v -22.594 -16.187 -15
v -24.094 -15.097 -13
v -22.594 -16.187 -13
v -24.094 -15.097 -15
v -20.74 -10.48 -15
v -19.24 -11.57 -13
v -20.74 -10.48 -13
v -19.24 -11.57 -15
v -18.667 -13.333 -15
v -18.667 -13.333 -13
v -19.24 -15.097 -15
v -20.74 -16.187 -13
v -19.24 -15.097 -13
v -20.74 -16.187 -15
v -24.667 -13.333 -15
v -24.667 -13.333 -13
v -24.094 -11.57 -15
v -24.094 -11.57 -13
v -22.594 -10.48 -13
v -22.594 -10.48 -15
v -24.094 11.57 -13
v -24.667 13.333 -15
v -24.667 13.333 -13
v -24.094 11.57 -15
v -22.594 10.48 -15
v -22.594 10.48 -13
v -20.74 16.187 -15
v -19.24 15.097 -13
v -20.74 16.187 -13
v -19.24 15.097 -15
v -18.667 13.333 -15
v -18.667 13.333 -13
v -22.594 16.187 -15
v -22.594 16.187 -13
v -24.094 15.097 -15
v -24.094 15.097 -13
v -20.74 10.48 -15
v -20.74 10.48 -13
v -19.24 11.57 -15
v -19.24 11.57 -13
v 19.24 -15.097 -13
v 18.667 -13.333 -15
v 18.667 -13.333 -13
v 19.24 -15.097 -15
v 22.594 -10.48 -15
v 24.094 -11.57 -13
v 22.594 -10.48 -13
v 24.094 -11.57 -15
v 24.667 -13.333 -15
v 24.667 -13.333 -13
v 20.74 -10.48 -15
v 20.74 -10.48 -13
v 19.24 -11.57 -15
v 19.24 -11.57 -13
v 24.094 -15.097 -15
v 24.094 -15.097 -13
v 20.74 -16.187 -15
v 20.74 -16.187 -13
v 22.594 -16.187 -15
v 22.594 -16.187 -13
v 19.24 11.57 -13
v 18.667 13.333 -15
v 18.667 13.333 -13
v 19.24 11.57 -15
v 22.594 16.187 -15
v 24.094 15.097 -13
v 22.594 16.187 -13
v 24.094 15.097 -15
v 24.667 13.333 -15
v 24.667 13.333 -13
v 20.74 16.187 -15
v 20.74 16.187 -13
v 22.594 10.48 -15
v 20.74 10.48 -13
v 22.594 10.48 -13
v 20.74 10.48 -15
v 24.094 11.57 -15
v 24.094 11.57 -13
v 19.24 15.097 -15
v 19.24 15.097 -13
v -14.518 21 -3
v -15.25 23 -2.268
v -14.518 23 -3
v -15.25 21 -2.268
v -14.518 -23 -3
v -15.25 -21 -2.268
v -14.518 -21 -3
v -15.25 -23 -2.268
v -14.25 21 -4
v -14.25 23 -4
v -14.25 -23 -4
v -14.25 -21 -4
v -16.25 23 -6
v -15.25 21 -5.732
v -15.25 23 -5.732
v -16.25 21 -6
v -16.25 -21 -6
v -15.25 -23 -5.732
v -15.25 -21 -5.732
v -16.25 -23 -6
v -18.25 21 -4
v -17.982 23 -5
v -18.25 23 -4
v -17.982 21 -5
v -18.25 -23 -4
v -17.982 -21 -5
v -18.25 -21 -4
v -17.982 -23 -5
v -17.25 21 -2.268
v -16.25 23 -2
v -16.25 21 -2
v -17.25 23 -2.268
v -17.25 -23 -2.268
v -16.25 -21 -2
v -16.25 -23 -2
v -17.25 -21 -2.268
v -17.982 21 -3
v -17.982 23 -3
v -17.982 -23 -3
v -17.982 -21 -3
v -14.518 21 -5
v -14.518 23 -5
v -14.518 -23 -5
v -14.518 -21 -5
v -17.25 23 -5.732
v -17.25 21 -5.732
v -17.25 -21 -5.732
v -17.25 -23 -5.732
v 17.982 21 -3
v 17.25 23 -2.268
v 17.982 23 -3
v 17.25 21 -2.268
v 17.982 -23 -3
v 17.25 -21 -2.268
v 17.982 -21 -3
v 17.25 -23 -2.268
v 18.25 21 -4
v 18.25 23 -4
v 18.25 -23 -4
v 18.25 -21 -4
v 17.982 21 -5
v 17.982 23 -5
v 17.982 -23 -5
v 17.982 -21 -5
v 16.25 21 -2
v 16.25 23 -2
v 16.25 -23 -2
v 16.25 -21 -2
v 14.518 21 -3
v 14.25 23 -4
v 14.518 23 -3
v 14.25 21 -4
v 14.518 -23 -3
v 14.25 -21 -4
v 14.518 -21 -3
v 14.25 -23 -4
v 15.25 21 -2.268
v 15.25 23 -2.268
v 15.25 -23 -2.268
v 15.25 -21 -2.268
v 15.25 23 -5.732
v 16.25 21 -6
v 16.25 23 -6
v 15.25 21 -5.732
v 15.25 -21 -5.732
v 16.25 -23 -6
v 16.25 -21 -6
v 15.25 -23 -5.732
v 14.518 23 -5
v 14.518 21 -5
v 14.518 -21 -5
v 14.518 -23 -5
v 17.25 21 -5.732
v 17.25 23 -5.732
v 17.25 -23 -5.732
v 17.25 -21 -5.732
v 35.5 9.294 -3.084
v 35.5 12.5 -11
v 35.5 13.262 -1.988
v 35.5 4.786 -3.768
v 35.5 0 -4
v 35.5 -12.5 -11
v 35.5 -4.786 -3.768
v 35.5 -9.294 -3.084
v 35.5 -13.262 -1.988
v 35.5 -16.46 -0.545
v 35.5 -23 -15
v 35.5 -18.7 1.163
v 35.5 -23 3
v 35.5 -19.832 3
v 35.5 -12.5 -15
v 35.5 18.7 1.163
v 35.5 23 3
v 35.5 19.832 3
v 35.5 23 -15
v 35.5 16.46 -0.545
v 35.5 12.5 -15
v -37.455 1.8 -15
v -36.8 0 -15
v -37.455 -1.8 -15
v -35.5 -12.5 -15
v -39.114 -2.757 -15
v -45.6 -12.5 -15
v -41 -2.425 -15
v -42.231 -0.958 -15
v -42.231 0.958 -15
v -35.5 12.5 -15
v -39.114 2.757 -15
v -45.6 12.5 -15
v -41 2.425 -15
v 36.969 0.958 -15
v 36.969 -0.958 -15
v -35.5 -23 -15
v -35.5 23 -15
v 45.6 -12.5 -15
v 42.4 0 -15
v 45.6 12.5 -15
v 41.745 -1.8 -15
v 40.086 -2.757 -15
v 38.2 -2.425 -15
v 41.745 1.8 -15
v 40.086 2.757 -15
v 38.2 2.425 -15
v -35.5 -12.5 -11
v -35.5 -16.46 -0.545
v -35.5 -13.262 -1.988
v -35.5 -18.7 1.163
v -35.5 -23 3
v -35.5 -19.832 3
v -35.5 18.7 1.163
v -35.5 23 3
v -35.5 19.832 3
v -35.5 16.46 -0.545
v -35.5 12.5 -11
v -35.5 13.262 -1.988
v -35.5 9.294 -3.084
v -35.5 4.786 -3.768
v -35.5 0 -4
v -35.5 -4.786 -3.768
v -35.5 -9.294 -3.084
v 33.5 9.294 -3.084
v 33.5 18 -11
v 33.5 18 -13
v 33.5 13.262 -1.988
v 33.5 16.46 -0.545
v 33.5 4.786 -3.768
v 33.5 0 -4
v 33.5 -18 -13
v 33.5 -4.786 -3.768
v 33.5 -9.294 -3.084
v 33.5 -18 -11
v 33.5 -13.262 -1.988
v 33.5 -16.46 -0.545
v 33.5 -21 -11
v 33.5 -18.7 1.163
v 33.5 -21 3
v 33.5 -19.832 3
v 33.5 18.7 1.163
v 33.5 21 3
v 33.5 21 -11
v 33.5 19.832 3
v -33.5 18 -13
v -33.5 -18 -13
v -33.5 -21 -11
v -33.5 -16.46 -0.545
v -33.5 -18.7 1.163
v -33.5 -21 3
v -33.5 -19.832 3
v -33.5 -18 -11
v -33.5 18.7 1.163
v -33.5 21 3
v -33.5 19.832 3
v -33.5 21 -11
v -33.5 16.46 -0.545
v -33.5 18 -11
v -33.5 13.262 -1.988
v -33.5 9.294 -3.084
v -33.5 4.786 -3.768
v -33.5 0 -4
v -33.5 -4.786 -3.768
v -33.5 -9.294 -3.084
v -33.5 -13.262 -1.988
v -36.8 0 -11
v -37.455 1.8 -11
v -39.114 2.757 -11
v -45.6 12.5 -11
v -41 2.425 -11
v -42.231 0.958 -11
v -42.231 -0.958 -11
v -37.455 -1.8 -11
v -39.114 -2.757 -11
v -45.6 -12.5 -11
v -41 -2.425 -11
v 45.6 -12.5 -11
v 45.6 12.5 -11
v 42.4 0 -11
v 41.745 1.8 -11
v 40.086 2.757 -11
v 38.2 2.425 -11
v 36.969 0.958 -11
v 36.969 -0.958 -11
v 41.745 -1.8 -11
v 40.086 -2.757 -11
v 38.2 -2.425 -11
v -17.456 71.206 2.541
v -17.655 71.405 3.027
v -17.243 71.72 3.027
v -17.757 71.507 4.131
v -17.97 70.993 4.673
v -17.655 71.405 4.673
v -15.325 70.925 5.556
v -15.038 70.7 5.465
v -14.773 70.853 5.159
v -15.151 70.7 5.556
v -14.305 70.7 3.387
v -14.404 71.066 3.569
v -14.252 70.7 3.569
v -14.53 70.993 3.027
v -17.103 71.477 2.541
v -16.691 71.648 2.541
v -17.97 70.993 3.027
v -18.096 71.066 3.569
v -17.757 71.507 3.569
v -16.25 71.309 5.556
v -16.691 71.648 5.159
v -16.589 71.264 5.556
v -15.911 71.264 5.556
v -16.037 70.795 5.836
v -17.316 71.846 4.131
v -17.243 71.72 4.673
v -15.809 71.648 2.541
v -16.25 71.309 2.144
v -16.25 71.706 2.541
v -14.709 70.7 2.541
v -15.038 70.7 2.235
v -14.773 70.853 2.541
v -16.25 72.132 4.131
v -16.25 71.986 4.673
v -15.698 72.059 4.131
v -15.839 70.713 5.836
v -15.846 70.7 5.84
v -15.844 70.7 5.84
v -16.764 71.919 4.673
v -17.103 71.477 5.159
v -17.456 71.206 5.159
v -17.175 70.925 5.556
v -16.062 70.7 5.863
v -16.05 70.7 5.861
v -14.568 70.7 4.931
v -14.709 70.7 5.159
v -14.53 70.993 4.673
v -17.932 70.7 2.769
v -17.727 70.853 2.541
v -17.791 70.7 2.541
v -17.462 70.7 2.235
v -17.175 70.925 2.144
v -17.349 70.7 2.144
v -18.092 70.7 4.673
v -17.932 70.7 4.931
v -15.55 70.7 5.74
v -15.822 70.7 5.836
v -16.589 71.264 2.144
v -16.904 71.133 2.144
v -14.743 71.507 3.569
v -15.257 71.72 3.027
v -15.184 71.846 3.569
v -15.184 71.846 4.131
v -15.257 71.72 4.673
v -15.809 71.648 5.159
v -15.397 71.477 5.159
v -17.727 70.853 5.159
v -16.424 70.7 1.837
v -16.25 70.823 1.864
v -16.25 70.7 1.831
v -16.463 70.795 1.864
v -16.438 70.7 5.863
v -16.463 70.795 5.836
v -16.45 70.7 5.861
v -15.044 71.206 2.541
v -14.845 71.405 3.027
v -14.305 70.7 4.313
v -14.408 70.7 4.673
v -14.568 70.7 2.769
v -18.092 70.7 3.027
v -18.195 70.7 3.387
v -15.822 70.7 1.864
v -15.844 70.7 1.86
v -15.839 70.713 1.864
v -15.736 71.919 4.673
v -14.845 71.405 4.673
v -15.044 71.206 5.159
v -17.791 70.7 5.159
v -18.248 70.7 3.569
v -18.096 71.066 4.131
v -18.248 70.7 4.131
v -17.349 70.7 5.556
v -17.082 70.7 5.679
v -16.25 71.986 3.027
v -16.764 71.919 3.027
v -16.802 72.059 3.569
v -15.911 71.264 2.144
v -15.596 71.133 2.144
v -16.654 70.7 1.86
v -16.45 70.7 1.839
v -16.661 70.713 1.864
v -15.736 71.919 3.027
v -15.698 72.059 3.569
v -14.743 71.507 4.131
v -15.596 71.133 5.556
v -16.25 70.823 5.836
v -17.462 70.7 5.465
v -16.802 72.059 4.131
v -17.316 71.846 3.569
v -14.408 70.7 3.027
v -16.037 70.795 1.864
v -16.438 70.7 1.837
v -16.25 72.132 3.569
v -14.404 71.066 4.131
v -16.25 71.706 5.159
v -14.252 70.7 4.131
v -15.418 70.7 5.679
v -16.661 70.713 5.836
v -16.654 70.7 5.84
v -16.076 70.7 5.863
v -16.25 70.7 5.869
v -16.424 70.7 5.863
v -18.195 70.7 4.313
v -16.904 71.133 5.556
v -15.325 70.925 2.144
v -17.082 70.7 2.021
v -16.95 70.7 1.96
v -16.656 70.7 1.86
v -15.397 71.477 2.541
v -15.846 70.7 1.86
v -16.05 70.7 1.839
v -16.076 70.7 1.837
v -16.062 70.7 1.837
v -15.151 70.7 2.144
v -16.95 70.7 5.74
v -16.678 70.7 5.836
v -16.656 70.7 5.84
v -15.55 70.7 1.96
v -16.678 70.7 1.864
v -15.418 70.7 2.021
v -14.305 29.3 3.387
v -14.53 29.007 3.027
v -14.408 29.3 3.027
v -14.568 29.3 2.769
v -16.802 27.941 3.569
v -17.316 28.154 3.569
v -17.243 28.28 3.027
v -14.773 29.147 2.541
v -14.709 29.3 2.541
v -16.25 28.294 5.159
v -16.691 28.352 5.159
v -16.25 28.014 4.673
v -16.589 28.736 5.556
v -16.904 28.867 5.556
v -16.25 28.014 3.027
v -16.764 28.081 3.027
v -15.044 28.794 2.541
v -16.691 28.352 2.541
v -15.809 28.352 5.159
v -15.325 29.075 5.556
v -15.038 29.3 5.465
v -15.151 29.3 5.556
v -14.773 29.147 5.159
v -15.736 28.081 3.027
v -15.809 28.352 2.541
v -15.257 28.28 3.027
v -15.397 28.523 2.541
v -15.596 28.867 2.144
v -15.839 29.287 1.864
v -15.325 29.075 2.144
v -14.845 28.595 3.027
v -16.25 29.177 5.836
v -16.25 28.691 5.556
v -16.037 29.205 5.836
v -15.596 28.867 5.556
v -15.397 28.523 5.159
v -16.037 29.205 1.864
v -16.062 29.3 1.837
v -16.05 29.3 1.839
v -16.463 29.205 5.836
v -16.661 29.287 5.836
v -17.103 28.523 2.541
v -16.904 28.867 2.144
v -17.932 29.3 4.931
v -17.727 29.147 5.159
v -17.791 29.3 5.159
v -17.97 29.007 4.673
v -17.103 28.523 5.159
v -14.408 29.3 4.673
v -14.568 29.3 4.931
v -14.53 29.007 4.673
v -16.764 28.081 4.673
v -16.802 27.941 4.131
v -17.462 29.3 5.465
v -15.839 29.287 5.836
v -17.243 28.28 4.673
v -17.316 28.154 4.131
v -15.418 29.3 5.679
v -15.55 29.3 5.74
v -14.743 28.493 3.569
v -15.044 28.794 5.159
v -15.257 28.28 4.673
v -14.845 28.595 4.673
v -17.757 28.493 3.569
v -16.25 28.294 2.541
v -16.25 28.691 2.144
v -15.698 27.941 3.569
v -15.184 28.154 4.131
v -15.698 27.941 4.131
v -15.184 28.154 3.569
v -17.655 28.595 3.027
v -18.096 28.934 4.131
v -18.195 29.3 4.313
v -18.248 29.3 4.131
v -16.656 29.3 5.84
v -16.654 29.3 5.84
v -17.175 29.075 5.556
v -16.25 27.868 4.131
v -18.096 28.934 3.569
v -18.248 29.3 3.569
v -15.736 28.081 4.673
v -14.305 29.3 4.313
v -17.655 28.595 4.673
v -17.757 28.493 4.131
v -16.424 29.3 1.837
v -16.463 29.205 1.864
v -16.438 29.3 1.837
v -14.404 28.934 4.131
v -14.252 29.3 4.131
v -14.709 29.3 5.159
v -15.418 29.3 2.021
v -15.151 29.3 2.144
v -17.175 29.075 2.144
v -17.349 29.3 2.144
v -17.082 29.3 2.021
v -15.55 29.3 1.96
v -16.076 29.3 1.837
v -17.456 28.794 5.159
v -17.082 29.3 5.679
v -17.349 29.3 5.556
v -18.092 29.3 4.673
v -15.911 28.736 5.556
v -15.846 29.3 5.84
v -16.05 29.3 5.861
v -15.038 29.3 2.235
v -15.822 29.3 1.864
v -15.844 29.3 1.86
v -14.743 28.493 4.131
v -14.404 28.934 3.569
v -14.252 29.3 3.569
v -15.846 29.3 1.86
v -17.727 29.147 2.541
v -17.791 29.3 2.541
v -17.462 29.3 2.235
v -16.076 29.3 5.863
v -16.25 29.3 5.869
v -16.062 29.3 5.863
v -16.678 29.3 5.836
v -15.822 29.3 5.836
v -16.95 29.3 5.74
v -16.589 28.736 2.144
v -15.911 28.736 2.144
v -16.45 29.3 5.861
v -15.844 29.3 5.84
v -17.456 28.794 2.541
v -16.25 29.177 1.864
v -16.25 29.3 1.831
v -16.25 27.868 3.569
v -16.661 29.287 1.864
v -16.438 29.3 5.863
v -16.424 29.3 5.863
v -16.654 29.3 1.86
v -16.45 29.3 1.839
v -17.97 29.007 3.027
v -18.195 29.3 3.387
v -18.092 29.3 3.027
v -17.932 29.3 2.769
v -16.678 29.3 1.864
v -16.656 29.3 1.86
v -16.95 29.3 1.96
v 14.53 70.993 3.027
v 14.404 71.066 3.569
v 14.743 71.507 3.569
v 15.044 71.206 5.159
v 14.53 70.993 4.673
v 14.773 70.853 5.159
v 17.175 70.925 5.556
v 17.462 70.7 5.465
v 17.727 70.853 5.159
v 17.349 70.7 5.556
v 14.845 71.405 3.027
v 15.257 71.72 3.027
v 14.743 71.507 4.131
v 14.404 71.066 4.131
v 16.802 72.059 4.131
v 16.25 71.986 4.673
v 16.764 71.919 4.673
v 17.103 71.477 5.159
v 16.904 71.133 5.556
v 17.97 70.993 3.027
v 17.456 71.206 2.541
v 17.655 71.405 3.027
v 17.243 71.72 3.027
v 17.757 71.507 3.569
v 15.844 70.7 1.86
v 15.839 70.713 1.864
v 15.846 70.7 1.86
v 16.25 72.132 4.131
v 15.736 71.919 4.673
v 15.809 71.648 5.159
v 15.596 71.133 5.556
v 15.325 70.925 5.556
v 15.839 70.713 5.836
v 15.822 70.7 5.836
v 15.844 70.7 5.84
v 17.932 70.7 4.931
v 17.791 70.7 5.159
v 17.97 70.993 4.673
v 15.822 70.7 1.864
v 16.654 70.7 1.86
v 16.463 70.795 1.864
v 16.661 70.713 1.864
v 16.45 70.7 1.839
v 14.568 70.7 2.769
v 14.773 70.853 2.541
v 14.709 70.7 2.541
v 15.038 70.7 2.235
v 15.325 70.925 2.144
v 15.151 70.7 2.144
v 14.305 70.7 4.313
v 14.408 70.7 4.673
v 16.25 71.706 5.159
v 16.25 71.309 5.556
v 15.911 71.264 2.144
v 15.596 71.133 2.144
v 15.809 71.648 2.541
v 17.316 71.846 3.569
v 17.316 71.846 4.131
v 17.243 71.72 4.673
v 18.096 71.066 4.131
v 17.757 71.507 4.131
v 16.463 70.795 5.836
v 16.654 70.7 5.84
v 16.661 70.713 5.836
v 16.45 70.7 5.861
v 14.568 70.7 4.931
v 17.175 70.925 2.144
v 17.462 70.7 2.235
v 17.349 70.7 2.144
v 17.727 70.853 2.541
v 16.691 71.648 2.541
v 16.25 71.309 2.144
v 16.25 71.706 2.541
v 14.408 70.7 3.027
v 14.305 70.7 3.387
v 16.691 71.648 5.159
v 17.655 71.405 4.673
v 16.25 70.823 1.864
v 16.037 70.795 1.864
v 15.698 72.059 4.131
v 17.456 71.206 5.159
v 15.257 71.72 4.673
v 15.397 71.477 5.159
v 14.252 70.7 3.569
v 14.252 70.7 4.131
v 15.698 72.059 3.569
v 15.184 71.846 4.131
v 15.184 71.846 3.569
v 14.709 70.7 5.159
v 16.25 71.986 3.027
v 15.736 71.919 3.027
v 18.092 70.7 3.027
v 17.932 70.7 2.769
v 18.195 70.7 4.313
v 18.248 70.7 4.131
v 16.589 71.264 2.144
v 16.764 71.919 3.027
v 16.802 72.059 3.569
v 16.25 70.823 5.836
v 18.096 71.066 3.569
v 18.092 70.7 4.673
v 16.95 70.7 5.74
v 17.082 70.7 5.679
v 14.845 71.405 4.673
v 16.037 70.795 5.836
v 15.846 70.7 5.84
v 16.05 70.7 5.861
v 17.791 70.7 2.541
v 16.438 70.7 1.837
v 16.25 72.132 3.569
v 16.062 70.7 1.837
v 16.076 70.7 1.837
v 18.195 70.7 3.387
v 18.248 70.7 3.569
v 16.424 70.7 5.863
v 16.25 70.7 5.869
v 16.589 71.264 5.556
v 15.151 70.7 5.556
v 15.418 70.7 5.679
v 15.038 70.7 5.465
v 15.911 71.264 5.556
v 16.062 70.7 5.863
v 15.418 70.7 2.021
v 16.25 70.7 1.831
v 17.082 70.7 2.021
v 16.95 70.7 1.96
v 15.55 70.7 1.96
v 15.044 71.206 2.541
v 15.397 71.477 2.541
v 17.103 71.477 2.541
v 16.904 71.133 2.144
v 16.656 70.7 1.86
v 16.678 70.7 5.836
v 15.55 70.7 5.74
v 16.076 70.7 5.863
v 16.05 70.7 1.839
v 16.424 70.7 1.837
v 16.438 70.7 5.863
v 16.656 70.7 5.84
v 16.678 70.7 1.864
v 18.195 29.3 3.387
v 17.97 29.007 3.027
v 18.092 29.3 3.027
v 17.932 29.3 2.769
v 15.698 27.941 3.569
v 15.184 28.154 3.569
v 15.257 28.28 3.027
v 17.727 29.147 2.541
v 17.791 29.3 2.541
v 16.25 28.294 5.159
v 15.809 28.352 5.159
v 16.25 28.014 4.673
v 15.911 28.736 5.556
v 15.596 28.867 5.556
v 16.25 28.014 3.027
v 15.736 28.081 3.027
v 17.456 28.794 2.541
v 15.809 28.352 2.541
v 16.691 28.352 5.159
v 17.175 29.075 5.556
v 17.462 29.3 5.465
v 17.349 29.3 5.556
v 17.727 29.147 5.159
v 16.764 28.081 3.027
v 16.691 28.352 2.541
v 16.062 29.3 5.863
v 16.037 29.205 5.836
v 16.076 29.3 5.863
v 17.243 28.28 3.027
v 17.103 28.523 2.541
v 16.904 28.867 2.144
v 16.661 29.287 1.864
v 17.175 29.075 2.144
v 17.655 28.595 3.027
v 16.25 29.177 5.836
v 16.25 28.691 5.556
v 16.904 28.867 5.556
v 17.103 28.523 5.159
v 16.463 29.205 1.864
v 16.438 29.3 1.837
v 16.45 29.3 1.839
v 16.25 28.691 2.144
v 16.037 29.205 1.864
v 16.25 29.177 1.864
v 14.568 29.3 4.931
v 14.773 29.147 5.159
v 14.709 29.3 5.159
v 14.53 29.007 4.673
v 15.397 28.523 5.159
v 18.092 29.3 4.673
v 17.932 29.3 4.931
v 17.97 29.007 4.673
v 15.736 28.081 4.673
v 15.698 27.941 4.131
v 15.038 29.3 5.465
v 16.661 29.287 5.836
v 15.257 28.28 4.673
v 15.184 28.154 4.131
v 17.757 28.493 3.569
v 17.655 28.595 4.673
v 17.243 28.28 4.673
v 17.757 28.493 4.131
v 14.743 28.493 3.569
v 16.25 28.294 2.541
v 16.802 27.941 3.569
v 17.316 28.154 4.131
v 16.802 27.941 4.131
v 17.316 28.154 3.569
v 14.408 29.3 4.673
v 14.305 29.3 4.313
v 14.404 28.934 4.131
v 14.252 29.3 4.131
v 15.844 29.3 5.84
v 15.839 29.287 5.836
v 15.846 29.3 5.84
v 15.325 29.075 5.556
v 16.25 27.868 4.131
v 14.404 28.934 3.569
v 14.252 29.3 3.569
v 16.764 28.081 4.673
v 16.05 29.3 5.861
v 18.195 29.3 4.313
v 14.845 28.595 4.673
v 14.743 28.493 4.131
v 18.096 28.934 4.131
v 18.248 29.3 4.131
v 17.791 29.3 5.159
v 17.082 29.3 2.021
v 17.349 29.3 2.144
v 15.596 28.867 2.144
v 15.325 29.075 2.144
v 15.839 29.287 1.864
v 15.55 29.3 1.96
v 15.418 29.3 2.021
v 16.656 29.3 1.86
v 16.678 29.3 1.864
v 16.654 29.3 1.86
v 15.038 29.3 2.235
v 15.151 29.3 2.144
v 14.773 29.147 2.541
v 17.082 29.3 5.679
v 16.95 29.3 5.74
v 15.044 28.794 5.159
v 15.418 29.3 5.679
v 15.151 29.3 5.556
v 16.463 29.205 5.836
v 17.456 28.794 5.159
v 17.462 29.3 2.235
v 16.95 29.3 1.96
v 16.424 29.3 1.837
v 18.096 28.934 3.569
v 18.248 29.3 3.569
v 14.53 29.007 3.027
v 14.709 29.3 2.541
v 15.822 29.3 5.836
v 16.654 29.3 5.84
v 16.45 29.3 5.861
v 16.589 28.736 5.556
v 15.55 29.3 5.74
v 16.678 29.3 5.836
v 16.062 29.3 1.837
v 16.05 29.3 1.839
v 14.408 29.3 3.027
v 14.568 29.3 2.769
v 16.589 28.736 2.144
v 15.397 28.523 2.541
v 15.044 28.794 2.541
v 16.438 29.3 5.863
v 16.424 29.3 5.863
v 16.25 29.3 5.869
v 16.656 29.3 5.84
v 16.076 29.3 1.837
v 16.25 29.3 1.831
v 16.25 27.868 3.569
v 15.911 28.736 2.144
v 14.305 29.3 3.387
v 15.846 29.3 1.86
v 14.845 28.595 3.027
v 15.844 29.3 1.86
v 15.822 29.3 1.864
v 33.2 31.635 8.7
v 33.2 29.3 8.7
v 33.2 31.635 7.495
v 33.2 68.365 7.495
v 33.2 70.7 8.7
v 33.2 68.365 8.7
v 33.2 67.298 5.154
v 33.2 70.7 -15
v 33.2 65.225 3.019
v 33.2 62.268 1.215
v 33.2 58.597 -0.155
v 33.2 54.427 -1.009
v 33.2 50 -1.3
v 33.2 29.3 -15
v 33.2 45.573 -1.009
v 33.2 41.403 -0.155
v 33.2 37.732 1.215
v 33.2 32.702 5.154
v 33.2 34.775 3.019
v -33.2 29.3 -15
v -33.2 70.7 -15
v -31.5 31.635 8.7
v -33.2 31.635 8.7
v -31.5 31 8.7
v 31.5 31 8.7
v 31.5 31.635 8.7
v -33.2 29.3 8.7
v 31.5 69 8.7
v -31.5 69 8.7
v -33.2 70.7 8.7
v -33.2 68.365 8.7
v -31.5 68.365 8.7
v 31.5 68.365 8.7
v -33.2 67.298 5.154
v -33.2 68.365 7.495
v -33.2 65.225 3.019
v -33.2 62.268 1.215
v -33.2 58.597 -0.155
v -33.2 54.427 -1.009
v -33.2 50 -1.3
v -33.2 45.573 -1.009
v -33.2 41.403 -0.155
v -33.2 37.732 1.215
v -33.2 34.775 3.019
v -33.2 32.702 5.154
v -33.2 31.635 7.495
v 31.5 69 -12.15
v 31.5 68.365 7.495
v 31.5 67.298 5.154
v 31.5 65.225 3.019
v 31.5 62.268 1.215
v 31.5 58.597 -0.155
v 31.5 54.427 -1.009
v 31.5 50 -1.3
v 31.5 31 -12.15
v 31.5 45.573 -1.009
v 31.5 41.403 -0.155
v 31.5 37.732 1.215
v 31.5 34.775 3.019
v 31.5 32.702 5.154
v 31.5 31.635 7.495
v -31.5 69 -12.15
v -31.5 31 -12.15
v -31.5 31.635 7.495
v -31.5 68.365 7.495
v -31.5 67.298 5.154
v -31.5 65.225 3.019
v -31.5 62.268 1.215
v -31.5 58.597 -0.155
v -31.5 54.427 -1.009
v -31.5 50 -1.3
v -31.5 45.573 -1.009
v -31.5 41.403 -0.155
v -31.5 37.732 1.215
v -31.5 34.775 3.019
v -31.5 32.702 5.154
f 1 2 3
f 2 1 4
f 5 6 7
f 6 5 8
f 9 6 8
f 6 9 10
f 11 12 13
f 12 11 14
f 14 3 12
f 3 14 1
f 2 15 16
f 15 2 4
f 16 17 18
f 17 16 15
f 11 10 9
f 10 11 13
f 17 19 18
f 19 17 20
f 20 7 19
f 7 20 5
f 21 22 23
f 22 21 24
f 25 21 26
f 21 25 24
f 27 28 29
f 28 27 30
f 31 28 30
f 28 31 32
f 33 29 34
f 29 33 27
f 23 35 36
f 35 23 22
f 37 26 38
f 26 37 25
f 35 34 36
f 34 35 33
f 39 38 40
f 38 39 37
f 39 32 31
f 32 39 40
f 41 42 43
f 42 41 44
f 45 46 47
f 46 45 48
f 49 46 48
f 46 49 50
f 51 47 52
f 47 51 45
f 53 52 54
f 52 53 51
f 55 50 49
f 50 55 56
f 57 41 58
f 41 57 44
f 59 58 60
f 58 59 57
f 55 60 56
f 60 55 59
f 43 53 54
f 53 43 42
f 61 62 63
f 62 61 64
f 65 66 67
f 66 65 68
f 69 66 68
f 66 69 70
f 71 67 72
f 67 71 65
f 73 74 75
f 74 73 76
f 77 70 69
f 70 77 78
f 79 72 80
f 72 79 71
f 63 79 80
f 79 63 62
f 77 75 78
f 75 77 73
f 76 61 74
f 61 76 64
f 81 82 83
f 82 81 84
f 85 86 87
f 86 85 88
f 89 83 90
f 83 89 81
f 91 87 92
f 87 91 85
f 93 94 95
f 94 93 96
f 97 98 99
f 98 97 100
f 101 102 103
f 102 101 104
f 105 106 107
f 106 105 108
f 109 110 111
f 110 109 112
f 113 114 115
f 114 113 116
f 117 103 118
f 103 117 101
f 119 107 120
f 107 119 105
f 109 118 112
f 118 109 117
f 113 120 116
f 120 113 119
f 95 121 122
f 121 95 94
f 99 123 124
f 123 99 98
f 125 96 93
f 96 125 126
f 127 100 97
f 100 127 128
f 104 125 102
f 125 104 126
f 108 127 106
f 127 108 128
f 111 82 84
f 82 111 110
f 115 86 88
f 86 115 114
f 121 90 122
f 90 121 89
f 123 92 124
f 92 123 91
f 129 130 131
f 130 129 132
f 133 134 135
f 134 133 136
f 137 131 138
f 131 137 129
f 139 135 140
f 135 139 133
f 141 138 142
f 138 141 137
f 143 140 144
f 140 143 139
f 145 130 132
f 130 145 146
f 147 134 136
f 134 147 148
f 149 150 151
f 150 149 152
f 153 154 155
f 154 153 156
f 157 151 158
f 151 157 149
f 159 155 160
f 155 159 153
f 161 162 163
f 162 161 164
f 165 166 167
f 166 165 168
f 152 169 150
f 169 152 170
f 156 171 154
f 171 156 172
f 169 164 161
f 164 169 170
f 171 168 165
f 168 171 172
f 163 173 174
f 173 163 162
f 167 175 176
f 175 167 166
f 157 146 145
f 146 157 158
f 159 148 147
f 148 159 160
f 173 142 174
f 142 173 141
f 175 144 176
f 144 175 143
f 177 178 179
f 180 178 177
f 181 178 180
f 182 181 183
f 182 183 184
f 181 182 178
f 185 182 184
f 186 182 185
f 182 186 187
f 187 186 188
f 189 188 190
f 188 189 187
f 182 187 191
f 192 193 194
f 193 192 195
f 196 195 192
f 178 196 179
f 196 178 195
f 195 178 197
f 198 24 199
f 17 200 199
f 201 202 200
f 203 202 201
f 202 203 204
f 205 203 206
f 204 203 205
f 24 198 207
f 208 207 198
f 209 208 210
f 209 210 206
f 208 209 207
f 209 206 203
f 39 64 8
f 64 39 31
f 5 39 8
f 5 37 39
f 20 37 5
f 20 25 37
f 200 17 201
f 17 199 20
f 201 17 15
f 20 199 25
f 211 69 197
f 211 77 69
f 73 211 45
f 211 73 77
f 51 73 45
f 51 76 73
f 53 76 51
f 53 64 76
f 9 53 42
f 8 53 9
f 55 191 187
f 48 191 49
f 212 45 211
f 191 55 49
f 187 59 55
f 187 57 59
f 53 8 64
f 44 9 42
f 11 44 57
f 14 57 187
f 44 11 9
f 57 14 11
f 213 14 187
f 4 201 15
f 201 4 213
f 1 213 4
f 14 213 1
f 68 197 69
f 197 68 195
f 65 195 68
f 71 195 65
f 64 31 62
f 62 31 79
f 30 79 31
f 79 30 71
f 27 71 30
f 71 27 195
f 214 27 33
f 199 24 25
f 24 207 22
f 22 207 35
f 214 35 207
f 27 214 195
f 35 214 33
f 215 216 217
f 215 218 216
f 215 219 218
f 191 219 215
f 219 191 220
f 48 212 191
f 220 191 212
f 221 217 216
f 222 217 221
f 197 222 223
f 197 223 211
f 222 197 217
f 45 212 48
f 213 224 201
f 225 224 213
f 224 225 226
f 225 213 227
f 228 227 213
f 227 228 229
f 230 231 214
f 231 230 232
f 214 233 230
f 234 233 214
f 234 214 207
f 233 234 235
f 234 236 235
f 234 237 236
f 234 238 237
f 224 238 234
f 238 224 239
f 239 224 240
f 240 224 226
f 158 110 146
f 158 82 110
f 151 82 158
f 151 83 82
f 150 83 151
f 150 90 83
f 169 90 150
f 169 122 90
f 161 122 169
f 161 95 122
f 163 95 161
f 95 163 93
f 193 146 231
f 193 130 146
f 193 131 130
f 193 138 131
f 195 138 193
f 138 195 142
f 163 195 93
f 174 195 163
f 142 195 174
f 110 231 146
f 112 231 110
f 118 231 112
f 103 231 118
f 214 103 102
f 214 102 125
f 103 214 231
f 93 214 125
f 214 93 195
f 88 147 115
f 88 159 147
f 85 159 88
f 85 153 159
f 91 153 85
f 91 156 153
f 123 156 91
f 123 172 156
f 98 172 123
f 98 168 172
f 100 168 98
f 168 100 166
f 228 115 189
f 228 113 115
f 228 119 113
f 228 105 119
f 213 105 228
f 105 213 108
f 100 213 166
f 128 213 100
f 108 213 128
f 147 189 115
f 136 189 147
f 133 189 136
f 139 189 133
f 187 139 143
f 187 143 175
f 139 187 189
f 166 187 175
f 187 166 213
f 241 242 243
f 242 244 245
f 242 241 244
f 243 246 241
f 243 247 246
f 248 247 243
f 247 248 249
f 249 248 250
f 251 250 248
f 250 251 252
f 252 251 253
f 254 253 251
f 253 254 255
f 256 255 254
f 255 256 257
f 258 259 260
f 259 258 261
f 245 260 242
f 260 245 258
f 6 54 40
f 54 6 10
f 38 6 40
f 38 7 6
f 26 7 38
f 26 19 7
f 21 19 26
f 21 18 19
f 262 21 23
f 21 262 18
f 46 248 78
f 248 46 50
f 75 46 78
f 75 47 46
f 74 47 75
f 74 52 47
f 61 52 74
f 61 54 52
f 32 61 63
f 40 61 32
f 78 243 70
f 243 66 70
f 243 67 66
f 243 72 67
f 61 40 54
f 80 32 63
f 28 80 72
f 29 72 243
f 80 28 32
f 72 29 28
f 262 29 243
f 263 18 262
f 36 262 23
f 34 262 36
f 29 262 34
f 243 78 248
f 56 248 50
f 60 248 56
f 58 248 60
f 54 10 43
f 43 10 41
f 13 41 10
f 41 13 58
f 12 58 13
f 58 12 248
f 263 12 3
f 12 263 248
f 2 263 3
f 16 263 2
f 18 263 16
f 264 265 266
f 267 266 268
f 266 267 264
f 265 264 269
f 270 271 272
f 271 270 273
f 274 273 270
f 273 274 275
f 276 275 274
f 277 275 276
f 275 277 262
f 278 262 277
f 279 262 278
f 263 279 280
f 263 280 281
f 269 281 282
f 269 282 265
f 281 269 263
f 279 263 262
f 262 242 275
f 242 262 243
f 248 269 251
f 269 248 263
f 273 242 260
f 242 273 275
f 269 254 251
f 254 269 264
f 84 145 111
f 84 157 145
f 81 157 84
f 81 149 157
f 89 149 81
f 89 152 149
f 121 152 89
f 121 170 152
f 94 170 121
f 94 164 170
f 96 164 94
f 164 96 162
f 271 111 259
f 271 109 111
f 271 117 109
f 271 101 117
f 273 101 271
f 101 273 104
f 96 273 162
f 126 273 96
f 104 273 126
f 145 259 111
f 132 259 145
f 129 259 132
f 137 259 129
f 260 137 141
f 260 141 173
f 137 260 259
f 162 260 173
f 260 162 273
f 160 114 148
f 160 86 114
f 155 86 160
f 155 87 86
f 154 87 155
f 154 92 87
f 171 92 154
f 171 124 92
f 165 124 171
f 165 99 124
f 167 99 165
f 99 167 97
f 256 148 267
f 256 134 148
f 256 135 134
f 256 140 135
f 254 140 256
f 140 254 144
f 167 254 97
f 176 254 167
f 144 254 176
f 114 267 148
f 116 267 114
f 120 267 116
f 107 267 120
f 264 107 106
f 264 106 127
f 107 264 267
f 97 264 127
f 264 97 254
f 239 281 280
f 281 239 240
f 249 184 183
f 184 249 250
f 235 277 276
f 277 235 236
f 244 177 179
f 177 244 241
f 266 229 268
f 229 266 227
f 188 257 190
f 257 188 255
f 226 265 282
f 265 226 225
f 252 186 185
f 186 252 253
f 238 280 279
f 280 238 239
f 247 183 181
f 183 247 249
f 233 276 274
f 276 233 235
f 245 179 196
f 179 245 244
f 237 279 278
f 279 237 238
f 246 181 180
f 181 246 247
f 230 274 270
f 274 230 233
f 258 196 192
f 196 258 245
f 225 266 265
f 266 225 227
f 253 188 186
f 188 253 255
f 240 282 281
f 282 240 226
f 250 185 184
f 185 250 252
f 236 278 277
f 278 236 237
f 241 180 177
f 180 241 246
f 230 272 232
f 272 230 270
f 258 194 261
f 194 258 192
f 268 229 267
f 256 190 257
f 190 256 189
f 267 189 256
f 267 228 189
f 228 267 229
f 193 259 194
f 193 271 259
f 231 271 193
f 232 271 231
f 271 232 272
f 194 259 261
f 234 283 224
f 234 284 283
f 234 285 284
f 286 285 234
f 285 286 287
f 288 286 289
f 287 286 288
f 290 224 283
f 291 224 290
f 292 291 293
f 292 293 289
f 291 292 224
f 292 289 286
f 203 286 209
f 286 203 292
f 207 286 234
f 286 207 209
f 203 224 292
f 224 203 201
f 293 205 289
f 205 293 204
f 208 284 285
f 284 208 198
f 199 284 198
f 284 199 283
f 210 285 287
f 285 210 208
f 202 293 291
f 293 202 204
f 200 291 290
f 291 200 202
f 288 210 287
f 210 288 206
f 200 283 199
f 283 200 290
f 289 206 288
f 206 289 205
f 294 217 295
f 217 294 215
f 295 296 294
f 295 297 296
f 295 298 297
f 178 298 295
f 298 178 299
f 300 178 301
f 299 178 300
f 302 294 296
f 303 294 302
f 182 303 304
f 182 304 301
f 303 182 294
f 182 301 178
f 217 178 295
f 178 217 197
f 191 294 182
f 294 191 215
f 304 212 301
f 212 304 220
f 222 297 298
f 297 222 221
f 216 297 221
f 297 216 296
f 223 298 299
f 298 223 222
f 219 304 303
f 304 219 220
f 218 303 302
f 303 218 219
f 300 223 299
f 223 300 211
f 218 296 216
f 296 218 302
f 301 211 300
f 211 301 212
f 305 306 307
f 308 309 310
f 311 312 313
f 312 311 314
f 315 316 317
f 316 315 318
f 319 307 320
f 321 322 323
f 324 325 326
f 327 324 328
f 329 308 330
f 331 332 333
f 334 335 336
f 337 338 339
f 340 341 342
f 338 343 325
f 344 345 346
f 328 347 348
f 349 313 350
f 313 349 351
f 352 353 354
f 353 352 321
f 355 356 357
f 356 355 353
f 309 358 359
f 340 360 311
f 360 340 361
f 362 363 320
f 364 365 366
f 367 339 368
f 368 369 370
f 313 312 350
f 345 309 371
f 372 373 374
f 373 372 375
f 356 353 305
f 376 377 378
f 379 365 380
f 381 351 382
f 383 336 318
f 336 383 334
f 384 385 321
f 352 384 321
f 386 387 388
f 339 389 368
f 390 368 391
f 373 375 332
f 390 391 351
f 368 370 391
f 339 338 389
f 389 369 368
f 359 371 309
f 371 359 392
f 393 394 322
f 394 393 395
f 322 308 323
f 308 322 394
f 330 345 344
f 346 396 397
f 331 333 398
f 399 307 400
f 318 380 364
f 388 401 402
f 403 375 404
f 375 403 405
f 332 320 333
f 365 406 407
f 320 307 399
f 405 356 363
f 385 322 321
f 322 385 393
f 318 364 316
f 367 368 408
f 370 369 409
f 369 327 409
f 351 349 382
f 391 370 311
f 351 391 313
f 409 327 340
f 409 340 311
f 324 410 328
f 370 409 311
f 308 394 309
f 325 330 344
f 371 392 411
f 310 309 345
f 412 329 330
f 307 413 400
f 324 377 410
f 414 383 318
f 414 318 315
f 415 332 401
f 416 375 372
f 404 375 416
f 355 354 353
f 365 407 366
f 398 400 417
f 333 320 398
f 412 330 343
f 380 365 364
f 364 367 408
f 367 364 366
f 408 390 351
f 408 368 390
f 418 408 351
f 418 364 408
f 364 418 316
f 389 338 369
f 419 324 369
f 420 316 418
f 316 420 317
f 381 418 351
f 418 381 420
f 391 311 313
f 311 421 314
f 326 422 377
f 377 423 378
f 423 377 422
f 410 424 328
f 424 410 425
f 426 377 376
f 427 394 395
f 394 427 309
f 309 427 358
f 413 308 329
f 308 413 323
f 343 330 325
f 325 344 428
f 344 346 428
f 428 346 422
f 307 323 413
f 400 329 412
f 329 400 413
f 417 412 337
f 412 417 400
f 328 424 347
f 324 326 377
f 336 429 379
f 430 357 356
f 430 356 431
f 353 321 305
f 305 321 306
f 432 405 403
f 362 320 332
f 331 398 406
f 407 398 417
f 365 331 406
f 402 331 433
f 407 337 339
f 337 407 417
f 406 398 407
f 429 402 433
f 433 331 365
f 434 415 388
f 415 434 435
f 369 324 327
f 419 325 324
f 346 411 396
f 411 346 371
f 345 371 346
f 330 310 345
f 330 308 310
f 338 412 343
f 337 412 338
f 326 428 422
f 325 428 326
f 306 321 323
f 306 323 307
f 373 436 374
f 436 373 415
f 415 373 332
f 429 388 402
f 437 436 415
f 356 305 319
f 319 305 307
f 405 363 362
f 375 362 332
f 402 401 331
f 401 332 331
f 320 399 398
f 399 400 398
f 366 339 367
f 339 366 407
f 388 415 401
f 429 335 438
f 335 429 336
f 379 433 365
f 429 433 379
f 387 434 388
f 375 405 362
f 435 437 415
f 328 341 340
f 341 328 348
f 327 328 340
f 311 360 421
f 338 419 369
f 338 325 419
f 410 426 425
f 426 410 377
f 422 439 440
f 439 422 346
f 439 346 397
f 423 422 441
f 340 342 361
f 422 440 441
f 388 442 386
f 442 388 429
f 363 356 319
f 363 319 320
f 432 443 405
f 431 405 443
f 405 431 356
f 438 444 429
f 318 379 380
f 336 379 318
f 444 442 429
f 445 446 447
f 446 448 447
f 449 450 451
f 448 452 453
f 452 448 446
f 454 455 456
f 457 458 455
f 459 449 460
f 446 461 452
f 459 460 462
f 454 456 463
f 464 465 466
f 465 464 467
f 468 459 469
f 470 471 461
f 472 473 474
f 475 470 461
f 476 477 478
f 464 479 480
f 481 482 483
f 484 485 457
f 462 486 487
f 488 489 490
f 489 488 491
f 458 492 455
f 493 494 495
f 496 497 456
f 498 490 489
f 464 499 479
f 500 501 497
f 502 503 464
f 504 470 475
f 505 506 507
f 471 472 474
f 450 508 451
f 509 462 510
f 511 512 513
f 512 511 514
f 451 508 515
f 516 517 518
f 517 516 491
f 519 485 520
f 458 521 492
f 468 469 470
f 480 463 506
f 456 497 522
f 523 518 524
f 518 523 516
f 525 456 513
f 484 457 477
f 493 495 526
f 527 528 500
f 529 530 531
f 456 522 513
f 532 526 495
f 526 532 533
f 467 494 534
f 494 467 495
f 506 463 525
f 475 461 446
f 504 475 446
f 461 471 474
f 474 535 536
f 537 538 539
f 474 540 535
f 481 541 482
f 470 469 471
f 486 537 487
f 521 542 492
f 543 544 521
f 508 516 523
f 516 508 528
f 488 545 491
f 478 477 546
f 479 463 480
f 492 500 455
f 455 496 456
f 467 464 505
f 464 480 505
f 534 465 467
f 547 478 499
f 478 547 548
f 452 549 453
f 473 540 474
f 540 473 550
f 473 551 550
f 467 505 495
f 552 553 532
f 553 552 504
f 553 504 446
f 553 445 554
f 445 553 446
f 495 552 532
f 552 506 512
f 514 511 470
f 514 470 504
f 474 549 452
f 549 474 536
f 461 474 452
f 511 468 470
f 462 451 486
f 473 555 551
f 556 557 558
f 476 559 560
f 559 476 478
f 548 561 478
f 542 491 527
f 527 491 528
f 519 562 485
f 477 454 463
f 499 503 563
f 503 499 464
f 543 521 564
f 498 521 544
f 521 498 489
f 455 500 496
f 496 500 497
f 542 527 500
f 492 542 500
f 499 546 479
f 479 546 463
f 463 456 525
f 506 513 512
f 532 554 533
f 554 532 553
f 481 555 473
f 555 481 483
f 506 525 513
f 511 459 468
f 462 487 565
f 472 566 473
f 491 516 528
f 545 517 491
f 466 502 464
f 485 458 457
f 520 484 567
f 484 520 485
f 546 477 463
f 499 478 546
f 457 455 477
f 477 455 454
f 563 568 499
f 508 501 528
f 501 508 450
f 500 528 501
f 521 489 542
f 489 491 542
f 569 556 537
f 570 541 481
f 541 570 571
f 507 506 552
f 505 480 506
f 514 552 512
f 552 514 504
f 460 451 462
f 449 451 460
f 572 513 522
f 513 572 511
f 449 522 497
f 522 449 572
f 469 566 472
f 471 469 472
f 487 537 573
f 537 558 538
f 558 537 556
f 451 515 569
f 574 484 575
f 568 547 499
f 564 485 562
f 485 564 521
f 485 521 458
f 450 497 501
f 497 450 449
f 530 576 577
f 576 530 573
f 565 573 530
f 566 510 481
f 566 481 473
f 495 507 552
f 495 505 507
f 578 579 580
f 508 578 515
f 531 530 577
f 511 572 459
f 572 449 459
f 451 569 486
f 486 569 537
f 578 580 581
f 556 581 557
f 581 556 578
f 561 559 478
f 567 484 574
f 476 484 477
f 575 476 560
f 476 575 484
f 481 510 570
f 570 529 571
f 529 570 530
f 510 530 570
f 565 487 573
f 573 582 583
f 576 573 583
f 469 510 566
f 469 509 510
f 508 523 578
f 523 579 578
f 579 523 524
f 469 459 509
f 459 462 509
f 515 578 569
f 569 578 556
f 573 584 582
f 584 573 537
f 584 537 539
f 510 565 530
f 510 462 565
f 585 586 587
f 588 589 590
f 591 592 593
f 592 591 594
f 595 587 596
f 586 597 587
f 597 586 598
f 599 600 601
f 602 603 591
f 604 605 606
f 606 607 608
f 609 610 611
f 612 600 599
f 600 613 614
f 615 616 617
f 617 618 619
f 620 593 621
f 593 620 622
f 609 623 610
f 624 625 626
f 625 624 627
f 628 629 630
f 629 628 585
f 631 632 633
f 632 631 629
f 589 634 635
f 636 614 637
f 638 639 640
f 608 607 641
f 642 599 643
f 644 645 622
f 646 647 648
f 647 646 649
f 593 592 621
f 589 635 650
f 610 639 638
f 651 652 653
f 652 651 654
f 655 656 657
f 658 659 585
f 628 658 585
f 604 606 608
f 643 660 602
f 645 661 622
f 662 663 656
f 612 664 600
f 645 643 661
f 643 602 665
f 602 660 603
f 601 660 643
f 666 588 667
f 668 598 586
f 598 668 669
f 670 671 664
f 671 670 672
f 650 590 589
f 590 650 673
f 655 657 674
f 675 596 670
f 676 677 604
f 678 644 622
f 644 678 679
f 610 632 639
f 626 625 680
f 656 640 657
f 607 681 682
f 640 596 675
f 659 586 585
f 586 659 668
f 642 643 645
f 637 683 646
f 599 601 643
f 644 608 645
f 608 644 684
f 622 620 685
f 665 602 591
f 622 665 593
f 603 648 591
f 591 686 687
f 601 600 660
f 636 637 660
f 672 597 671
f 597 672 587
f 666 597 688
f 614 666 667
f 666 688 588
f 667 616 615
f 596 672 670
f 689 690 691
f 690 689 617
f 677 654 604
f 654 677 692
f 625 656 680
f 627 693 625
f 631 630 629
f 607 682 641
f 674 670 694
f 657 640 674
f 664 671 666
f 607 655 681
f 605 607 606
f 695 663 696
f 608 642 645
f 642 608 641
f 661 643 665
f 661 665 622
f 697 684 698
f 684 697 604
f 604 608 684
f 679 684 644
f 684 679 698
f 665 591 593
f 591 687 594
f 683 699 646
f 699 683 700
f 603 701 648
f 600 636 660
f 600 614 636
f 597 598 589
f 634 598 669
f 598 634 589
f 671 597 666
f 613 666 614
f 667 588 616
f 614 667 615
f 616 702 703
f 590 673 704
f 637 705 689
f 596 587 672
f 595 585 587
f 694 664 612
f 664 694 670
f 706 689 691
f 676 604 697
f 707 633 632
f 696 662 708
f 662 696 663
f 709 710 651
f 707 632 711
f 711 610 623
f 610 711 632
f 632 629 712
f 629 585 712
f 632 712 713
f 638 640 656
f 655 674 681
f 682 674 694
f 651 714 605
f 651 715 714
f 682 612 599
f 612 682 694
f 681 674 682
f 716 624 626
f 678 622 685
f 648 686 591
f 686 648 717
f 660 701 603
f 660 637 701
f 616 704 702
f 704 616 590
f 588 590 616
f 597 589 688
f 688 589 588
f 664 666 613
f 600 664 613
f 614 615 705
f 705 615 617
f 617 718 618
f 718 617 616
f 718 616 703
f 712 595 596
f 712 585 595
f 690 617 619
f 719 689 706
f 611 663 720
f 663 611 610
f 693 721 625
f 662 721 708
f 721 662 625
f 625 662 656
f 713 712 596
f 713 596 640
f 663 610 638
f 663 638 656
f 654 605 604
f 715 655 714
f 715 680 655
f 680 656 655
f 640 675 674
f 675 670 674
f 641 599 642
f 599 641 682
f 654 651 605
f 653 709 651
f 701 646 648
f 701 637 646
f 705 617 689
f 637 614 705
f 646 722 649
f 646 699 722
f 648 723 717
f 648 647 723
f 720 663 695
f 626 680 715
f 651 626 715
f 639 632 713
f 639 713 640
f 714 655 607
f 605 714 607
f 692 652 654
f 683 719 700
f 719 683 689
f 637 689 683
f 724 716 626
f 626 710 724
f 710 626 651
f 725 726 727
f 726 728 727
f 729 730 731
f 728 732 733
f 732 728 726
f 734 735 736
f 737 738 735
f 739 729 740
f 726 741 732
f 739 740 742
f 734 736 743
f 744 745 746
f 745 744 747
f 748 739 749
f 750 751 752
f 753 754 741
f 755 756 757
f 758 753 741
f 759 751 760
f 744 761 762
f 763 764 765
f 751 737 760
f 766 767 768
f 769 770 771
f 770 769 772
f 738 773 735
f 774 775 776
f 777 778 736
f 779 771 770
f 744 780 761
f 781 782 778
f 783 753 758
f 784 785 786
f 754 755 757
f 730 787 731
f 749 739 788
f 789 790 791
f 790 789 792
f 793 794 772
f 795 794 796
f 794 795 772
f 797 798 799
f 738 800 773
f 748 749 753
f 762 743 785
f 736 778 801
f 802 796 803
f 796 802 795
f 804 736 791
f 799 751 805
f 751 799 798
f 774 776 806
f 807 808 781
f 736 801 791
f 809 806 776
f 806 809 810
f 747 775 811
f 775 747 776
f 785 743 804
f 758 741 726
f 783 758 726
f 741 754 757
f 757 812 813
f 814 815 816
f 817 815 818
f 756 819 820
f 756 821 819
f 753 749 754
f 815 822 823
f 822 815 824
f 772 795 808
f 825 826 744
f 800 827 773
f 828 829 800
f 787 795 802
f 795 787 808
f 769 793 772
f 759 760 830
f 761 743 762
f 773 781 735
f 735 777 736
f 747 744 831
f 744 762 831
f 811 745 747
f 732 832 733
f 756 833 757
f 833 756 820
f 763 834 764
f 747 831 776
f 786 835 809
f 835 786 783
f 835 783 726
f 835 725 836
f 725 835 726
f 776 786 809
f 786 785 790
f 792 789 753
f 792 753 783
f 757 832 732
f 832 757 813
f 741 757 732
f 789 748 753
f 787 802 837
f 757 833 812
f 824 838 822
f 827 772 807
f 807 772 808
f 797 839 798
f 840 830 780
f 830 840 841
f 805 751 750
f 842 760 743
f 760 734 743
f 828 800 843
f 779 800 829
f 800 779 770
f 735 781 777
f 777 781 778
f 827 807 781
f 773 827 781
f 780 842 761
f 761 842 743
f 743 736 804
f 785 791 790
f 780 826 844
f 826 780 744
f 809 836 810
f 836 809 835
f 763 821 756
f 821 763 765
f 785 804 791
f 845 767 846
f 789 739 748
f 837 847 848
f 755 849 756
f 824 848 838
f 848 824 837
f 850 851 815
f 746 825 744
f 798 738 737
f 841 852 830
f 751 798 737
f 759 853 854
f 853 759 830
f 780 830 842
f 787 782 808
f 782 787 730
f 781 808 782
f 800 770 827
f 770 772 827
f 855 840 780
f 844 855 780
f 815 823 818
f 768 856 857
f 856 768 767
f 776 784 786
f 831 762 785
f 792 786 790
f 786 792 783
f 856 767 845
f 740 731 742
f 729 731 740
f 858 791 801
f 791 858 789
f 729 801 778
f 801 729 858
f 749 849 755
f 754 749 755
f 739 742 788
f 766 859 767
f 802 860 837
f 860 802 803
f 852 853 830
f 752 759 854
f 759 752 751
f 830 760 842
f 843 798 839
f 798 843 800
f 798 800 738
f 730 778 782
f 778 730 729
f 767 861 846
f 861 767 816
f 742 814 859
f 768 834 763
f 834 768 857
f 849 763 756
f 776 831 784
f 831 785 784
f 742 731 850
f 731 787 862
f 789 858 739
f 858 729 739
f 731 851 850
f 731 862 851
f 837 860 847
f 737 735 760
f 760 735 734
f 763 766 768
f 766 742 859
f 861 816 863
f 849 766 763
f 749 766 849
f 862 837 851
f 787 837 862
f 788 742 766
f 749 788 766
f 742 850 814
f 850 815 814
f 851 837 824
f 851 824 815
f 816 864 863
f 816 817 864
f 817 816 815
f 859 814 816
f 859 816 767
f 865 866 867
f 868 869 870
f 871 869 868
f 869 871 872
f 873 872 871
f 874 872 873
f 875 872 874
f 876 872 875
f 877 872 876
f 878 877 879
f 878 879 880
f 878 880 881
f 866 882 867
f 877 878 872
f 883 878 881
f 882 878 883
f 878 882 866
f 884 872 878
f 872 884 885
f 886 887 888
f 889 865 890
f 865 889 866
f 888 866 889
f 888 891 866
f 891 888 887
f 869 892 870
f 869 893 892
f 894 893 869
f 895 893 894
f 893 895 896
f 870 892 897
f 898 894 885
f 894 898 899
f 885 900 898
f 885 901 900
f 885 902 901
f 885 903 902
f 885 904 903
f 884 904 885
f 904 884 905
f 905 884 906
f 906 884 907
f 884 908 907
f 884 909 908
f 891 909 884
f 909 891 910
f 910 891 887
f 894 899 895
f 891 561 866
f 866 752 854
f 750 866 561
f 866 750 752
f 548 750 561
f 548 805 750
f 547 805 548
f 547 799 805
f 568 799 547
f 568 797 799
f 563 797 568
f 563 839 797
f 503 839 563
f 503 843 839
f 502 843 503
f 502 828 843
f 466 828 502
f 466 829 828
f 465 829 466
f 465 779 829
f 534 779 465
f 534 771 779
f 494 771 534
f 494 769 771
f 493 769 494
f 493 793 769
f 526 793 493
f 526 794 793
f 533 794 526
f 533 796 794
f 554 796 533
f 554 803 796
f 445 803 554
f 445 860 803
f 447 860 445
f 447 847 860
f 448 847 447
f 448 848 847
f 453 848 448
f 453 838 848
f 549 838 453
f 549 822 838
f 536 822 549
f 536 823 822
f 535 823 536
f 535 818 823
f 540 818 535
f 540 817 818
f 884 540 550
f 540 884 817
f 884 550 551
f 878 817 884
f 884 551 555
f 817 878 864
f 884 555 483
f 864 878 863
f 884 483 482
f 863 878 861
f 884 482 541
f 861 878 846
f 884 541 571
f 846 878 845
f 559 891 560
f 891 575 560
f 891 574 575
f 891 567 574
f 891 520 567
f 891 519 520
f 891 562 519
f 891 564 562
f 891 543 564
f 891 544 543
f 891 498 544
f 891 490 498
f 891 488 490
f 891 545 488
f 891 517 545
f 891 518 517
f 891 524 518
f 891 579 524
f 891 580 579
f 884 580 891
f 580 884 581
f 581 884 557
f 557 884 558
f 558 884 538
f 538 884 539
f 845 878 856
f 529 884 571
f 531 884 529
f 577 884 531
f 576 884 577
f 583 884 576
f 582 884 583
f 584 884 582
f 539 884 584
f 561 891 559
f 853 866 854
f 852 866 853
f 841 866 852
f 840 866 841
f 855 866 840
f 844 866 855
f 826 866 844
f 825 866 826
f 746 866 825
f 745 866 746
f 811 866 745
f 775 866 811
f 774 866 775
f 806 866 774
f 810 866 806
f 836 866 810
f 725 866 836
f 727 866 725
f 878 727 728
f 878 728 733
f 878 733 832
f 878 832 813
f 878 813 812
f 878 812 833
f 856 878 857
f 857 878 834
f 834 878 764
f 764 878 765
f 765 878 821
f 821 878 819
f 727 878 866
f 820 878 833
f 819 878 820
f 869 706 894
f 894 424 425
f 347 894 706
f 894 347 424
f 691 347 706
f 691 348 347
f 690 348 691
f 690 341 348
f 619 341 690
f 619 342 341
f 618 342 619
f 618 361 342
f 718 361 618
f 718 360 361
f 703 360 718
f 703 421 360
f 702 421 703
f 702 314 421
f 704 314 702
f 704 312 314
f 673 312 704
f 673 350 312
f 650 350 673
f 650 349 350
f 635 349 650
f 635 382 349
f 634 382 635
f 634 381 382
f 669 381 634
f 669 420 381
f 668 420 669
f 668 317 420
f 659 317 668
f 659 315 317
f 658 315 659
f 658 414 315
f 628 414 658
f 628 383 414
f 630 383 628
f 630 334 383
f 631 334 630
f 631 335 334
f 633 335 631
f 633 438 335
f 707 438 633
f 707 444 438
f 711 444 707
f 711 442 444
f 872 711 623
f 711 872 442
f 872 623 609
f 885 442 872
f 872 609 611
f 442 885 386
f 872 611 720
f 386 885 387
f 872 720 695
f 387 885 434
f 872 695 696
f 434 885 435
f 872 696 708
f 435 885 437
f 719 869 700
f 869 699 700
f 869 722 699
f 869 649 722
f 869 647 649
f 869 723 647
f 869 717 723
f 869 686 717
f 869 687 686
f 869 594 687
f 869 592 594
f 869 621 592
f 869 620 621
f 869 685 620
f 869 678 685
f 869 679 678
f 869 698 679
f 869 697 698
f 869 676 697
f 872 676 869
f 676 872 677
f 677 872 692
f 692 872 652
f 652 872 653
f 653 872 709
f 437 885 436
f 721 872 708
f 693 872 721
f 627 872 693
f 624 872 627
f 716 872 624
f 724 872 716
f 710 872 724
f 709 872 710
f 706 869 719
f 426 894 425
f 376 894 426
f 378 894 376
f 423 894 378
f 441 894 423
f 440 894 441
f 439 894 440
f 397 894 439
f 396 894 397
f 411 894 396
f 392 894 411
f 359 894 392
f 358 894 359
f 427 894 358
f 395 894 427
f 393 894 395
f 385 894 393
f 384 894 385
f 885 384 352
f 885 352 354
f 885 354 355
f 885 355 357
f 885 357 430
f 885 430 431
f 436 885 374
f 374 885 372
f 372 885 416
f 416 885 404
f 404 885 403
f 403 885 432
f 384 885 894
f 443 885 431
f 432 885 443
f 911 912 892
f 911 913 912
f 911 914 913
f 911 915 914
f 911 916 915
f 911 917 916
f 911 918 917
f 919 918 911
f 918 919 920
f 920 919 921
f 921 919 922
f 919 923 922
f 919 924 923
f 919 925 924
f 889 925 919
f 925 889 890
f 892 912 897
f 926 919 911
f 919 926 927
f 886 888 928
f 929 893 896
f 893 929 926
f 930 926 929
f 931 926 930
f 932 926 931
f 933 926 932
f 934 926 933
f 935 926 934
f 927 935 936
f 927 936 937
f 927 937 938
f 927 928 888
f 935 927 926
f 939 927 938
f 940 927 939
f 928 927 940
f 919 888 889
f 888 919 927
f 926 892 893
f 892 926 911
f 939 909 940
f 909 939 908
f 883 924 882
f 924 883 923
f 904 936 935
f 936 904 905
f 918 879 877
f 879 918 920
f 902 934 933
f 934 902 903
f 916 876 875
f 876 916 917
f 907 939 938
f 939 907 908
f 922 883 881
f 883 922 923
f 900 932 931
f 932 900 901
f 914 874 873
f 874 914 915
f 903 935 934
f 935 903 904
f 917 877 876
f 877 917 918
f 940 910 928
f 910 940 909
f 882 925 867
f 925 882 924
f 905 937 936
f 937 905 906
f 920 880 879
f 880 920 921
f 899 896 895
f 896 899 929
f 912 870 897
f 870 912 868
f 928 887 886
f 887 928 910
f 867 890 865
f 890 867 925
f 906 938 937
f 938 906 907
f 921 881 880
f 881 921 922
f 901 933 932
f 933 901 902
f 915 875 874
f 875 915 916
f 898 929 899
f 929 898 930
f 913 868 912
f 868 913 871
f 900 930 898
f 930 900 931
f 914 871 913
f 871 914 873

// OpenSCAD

pcb = [ 65, 40, 22 ];
//pcb = [ 80, 44, 16 ];

c = 0.3;

difference()
{
translate( [ 0, 0, 0 ] )
 box( pcb[0]+6, pcb[1]+6, pcb[2]+8 );
translate( [ 0, 0, 1 ] )
 box( pcb[0]+2, pcb[1]-4, pcb[2]+6 );
translate( [ 0, 0, 2 ] )
 box( pcb[0]+2, pcb[1]+2, pcb[2]+4 );

for ( a = [ -1, +1 ], b = [ -1, +1 ] )
	translate( [ a*pcb[0]/3, b*pcb[1]/3, 0 ] )
		cylinder( r = 3, h = pcb[2]*2, center = true );

translate( [ 0, 0, -pcb[2]/2+12+3 ] ) rotate( [ 0, 90, 0 ] ) scale( [ 1, pcb[1]/16, 1 ] )
 cylinder( r = 8, h = pcb[0]*2, center = true );

for ( a = [ -1, +1 ] )
	translate( [ a*pcb[0]/4, 0, -pcb[2]/2+7 ] ) rotate( [ 90, 0, 0 ] )
		cylinder( r = 2, h = pcb[1]*2, center = true, $fn = 12 );

translate( [ 0, 0, 12 ] )
	box( pcb[0]+10, pcb[1]+10, pcb[2]-8/2 );
}

for ( a = [ -1, +1 ] )
translate( [ a*(pcb[0]/2+7.1), 0, - pcb[2]/2-2 ] )
	difference()
	{
		box( 12, 25, 4 );
		cylinder( r = 2.5+c, h = 10, center = true );
	}

translate( [ 0, pcb[1]+10, -c/2 ] )
rotate( [ 180, 0, 0 ] )
difference()
{
union()
{
	translate( [ 0, 0, 3 ] )
		box( pcb[0]+2-2*c, pcb[1]+2-2*c, pcb[2]+2-c );
	for ( a = [ -1, +1 ], b = [ -1, +1 ] )
		translate( [ a*pcb[0]/4, b*pcb[1]/2, -pcb[2]/2+7 ] )
			sphere( r = 2.15, center = true, $fn = 24 );
}
translate( [ 0, 0, 1 ] )
	box( pcb[0]-2, pcb[1]-2, pcb[2] );
translate( [ 0, 0, 3-(pcb[2]+2-c)/2 ] ) rotate( [ 0, 90, 0 ] ) scale( [ 1.25, (pcb[1]-3)/16, 1 ] )
	cylinder( r = 8, h = pcb[0]*2, center = true );
}


module box( x, y, z, w = 0 )
{
	difference()
	{
		cube( [ x - ( w < 0 ? w*2 : 0 ), y - ( w < 0 ? w*2 : 0 ), z - ( w < 0 ? w*2 : 0 ) ], center = true );

		if ( w != 0 )
			cube( [ x - ( w > 0 ? w*2 : 0 ), y - ( w > 0 ? w*2 : 0 ), z - ( w > 0 ? w*2 : 0 ) ], center = true );
	}
}

